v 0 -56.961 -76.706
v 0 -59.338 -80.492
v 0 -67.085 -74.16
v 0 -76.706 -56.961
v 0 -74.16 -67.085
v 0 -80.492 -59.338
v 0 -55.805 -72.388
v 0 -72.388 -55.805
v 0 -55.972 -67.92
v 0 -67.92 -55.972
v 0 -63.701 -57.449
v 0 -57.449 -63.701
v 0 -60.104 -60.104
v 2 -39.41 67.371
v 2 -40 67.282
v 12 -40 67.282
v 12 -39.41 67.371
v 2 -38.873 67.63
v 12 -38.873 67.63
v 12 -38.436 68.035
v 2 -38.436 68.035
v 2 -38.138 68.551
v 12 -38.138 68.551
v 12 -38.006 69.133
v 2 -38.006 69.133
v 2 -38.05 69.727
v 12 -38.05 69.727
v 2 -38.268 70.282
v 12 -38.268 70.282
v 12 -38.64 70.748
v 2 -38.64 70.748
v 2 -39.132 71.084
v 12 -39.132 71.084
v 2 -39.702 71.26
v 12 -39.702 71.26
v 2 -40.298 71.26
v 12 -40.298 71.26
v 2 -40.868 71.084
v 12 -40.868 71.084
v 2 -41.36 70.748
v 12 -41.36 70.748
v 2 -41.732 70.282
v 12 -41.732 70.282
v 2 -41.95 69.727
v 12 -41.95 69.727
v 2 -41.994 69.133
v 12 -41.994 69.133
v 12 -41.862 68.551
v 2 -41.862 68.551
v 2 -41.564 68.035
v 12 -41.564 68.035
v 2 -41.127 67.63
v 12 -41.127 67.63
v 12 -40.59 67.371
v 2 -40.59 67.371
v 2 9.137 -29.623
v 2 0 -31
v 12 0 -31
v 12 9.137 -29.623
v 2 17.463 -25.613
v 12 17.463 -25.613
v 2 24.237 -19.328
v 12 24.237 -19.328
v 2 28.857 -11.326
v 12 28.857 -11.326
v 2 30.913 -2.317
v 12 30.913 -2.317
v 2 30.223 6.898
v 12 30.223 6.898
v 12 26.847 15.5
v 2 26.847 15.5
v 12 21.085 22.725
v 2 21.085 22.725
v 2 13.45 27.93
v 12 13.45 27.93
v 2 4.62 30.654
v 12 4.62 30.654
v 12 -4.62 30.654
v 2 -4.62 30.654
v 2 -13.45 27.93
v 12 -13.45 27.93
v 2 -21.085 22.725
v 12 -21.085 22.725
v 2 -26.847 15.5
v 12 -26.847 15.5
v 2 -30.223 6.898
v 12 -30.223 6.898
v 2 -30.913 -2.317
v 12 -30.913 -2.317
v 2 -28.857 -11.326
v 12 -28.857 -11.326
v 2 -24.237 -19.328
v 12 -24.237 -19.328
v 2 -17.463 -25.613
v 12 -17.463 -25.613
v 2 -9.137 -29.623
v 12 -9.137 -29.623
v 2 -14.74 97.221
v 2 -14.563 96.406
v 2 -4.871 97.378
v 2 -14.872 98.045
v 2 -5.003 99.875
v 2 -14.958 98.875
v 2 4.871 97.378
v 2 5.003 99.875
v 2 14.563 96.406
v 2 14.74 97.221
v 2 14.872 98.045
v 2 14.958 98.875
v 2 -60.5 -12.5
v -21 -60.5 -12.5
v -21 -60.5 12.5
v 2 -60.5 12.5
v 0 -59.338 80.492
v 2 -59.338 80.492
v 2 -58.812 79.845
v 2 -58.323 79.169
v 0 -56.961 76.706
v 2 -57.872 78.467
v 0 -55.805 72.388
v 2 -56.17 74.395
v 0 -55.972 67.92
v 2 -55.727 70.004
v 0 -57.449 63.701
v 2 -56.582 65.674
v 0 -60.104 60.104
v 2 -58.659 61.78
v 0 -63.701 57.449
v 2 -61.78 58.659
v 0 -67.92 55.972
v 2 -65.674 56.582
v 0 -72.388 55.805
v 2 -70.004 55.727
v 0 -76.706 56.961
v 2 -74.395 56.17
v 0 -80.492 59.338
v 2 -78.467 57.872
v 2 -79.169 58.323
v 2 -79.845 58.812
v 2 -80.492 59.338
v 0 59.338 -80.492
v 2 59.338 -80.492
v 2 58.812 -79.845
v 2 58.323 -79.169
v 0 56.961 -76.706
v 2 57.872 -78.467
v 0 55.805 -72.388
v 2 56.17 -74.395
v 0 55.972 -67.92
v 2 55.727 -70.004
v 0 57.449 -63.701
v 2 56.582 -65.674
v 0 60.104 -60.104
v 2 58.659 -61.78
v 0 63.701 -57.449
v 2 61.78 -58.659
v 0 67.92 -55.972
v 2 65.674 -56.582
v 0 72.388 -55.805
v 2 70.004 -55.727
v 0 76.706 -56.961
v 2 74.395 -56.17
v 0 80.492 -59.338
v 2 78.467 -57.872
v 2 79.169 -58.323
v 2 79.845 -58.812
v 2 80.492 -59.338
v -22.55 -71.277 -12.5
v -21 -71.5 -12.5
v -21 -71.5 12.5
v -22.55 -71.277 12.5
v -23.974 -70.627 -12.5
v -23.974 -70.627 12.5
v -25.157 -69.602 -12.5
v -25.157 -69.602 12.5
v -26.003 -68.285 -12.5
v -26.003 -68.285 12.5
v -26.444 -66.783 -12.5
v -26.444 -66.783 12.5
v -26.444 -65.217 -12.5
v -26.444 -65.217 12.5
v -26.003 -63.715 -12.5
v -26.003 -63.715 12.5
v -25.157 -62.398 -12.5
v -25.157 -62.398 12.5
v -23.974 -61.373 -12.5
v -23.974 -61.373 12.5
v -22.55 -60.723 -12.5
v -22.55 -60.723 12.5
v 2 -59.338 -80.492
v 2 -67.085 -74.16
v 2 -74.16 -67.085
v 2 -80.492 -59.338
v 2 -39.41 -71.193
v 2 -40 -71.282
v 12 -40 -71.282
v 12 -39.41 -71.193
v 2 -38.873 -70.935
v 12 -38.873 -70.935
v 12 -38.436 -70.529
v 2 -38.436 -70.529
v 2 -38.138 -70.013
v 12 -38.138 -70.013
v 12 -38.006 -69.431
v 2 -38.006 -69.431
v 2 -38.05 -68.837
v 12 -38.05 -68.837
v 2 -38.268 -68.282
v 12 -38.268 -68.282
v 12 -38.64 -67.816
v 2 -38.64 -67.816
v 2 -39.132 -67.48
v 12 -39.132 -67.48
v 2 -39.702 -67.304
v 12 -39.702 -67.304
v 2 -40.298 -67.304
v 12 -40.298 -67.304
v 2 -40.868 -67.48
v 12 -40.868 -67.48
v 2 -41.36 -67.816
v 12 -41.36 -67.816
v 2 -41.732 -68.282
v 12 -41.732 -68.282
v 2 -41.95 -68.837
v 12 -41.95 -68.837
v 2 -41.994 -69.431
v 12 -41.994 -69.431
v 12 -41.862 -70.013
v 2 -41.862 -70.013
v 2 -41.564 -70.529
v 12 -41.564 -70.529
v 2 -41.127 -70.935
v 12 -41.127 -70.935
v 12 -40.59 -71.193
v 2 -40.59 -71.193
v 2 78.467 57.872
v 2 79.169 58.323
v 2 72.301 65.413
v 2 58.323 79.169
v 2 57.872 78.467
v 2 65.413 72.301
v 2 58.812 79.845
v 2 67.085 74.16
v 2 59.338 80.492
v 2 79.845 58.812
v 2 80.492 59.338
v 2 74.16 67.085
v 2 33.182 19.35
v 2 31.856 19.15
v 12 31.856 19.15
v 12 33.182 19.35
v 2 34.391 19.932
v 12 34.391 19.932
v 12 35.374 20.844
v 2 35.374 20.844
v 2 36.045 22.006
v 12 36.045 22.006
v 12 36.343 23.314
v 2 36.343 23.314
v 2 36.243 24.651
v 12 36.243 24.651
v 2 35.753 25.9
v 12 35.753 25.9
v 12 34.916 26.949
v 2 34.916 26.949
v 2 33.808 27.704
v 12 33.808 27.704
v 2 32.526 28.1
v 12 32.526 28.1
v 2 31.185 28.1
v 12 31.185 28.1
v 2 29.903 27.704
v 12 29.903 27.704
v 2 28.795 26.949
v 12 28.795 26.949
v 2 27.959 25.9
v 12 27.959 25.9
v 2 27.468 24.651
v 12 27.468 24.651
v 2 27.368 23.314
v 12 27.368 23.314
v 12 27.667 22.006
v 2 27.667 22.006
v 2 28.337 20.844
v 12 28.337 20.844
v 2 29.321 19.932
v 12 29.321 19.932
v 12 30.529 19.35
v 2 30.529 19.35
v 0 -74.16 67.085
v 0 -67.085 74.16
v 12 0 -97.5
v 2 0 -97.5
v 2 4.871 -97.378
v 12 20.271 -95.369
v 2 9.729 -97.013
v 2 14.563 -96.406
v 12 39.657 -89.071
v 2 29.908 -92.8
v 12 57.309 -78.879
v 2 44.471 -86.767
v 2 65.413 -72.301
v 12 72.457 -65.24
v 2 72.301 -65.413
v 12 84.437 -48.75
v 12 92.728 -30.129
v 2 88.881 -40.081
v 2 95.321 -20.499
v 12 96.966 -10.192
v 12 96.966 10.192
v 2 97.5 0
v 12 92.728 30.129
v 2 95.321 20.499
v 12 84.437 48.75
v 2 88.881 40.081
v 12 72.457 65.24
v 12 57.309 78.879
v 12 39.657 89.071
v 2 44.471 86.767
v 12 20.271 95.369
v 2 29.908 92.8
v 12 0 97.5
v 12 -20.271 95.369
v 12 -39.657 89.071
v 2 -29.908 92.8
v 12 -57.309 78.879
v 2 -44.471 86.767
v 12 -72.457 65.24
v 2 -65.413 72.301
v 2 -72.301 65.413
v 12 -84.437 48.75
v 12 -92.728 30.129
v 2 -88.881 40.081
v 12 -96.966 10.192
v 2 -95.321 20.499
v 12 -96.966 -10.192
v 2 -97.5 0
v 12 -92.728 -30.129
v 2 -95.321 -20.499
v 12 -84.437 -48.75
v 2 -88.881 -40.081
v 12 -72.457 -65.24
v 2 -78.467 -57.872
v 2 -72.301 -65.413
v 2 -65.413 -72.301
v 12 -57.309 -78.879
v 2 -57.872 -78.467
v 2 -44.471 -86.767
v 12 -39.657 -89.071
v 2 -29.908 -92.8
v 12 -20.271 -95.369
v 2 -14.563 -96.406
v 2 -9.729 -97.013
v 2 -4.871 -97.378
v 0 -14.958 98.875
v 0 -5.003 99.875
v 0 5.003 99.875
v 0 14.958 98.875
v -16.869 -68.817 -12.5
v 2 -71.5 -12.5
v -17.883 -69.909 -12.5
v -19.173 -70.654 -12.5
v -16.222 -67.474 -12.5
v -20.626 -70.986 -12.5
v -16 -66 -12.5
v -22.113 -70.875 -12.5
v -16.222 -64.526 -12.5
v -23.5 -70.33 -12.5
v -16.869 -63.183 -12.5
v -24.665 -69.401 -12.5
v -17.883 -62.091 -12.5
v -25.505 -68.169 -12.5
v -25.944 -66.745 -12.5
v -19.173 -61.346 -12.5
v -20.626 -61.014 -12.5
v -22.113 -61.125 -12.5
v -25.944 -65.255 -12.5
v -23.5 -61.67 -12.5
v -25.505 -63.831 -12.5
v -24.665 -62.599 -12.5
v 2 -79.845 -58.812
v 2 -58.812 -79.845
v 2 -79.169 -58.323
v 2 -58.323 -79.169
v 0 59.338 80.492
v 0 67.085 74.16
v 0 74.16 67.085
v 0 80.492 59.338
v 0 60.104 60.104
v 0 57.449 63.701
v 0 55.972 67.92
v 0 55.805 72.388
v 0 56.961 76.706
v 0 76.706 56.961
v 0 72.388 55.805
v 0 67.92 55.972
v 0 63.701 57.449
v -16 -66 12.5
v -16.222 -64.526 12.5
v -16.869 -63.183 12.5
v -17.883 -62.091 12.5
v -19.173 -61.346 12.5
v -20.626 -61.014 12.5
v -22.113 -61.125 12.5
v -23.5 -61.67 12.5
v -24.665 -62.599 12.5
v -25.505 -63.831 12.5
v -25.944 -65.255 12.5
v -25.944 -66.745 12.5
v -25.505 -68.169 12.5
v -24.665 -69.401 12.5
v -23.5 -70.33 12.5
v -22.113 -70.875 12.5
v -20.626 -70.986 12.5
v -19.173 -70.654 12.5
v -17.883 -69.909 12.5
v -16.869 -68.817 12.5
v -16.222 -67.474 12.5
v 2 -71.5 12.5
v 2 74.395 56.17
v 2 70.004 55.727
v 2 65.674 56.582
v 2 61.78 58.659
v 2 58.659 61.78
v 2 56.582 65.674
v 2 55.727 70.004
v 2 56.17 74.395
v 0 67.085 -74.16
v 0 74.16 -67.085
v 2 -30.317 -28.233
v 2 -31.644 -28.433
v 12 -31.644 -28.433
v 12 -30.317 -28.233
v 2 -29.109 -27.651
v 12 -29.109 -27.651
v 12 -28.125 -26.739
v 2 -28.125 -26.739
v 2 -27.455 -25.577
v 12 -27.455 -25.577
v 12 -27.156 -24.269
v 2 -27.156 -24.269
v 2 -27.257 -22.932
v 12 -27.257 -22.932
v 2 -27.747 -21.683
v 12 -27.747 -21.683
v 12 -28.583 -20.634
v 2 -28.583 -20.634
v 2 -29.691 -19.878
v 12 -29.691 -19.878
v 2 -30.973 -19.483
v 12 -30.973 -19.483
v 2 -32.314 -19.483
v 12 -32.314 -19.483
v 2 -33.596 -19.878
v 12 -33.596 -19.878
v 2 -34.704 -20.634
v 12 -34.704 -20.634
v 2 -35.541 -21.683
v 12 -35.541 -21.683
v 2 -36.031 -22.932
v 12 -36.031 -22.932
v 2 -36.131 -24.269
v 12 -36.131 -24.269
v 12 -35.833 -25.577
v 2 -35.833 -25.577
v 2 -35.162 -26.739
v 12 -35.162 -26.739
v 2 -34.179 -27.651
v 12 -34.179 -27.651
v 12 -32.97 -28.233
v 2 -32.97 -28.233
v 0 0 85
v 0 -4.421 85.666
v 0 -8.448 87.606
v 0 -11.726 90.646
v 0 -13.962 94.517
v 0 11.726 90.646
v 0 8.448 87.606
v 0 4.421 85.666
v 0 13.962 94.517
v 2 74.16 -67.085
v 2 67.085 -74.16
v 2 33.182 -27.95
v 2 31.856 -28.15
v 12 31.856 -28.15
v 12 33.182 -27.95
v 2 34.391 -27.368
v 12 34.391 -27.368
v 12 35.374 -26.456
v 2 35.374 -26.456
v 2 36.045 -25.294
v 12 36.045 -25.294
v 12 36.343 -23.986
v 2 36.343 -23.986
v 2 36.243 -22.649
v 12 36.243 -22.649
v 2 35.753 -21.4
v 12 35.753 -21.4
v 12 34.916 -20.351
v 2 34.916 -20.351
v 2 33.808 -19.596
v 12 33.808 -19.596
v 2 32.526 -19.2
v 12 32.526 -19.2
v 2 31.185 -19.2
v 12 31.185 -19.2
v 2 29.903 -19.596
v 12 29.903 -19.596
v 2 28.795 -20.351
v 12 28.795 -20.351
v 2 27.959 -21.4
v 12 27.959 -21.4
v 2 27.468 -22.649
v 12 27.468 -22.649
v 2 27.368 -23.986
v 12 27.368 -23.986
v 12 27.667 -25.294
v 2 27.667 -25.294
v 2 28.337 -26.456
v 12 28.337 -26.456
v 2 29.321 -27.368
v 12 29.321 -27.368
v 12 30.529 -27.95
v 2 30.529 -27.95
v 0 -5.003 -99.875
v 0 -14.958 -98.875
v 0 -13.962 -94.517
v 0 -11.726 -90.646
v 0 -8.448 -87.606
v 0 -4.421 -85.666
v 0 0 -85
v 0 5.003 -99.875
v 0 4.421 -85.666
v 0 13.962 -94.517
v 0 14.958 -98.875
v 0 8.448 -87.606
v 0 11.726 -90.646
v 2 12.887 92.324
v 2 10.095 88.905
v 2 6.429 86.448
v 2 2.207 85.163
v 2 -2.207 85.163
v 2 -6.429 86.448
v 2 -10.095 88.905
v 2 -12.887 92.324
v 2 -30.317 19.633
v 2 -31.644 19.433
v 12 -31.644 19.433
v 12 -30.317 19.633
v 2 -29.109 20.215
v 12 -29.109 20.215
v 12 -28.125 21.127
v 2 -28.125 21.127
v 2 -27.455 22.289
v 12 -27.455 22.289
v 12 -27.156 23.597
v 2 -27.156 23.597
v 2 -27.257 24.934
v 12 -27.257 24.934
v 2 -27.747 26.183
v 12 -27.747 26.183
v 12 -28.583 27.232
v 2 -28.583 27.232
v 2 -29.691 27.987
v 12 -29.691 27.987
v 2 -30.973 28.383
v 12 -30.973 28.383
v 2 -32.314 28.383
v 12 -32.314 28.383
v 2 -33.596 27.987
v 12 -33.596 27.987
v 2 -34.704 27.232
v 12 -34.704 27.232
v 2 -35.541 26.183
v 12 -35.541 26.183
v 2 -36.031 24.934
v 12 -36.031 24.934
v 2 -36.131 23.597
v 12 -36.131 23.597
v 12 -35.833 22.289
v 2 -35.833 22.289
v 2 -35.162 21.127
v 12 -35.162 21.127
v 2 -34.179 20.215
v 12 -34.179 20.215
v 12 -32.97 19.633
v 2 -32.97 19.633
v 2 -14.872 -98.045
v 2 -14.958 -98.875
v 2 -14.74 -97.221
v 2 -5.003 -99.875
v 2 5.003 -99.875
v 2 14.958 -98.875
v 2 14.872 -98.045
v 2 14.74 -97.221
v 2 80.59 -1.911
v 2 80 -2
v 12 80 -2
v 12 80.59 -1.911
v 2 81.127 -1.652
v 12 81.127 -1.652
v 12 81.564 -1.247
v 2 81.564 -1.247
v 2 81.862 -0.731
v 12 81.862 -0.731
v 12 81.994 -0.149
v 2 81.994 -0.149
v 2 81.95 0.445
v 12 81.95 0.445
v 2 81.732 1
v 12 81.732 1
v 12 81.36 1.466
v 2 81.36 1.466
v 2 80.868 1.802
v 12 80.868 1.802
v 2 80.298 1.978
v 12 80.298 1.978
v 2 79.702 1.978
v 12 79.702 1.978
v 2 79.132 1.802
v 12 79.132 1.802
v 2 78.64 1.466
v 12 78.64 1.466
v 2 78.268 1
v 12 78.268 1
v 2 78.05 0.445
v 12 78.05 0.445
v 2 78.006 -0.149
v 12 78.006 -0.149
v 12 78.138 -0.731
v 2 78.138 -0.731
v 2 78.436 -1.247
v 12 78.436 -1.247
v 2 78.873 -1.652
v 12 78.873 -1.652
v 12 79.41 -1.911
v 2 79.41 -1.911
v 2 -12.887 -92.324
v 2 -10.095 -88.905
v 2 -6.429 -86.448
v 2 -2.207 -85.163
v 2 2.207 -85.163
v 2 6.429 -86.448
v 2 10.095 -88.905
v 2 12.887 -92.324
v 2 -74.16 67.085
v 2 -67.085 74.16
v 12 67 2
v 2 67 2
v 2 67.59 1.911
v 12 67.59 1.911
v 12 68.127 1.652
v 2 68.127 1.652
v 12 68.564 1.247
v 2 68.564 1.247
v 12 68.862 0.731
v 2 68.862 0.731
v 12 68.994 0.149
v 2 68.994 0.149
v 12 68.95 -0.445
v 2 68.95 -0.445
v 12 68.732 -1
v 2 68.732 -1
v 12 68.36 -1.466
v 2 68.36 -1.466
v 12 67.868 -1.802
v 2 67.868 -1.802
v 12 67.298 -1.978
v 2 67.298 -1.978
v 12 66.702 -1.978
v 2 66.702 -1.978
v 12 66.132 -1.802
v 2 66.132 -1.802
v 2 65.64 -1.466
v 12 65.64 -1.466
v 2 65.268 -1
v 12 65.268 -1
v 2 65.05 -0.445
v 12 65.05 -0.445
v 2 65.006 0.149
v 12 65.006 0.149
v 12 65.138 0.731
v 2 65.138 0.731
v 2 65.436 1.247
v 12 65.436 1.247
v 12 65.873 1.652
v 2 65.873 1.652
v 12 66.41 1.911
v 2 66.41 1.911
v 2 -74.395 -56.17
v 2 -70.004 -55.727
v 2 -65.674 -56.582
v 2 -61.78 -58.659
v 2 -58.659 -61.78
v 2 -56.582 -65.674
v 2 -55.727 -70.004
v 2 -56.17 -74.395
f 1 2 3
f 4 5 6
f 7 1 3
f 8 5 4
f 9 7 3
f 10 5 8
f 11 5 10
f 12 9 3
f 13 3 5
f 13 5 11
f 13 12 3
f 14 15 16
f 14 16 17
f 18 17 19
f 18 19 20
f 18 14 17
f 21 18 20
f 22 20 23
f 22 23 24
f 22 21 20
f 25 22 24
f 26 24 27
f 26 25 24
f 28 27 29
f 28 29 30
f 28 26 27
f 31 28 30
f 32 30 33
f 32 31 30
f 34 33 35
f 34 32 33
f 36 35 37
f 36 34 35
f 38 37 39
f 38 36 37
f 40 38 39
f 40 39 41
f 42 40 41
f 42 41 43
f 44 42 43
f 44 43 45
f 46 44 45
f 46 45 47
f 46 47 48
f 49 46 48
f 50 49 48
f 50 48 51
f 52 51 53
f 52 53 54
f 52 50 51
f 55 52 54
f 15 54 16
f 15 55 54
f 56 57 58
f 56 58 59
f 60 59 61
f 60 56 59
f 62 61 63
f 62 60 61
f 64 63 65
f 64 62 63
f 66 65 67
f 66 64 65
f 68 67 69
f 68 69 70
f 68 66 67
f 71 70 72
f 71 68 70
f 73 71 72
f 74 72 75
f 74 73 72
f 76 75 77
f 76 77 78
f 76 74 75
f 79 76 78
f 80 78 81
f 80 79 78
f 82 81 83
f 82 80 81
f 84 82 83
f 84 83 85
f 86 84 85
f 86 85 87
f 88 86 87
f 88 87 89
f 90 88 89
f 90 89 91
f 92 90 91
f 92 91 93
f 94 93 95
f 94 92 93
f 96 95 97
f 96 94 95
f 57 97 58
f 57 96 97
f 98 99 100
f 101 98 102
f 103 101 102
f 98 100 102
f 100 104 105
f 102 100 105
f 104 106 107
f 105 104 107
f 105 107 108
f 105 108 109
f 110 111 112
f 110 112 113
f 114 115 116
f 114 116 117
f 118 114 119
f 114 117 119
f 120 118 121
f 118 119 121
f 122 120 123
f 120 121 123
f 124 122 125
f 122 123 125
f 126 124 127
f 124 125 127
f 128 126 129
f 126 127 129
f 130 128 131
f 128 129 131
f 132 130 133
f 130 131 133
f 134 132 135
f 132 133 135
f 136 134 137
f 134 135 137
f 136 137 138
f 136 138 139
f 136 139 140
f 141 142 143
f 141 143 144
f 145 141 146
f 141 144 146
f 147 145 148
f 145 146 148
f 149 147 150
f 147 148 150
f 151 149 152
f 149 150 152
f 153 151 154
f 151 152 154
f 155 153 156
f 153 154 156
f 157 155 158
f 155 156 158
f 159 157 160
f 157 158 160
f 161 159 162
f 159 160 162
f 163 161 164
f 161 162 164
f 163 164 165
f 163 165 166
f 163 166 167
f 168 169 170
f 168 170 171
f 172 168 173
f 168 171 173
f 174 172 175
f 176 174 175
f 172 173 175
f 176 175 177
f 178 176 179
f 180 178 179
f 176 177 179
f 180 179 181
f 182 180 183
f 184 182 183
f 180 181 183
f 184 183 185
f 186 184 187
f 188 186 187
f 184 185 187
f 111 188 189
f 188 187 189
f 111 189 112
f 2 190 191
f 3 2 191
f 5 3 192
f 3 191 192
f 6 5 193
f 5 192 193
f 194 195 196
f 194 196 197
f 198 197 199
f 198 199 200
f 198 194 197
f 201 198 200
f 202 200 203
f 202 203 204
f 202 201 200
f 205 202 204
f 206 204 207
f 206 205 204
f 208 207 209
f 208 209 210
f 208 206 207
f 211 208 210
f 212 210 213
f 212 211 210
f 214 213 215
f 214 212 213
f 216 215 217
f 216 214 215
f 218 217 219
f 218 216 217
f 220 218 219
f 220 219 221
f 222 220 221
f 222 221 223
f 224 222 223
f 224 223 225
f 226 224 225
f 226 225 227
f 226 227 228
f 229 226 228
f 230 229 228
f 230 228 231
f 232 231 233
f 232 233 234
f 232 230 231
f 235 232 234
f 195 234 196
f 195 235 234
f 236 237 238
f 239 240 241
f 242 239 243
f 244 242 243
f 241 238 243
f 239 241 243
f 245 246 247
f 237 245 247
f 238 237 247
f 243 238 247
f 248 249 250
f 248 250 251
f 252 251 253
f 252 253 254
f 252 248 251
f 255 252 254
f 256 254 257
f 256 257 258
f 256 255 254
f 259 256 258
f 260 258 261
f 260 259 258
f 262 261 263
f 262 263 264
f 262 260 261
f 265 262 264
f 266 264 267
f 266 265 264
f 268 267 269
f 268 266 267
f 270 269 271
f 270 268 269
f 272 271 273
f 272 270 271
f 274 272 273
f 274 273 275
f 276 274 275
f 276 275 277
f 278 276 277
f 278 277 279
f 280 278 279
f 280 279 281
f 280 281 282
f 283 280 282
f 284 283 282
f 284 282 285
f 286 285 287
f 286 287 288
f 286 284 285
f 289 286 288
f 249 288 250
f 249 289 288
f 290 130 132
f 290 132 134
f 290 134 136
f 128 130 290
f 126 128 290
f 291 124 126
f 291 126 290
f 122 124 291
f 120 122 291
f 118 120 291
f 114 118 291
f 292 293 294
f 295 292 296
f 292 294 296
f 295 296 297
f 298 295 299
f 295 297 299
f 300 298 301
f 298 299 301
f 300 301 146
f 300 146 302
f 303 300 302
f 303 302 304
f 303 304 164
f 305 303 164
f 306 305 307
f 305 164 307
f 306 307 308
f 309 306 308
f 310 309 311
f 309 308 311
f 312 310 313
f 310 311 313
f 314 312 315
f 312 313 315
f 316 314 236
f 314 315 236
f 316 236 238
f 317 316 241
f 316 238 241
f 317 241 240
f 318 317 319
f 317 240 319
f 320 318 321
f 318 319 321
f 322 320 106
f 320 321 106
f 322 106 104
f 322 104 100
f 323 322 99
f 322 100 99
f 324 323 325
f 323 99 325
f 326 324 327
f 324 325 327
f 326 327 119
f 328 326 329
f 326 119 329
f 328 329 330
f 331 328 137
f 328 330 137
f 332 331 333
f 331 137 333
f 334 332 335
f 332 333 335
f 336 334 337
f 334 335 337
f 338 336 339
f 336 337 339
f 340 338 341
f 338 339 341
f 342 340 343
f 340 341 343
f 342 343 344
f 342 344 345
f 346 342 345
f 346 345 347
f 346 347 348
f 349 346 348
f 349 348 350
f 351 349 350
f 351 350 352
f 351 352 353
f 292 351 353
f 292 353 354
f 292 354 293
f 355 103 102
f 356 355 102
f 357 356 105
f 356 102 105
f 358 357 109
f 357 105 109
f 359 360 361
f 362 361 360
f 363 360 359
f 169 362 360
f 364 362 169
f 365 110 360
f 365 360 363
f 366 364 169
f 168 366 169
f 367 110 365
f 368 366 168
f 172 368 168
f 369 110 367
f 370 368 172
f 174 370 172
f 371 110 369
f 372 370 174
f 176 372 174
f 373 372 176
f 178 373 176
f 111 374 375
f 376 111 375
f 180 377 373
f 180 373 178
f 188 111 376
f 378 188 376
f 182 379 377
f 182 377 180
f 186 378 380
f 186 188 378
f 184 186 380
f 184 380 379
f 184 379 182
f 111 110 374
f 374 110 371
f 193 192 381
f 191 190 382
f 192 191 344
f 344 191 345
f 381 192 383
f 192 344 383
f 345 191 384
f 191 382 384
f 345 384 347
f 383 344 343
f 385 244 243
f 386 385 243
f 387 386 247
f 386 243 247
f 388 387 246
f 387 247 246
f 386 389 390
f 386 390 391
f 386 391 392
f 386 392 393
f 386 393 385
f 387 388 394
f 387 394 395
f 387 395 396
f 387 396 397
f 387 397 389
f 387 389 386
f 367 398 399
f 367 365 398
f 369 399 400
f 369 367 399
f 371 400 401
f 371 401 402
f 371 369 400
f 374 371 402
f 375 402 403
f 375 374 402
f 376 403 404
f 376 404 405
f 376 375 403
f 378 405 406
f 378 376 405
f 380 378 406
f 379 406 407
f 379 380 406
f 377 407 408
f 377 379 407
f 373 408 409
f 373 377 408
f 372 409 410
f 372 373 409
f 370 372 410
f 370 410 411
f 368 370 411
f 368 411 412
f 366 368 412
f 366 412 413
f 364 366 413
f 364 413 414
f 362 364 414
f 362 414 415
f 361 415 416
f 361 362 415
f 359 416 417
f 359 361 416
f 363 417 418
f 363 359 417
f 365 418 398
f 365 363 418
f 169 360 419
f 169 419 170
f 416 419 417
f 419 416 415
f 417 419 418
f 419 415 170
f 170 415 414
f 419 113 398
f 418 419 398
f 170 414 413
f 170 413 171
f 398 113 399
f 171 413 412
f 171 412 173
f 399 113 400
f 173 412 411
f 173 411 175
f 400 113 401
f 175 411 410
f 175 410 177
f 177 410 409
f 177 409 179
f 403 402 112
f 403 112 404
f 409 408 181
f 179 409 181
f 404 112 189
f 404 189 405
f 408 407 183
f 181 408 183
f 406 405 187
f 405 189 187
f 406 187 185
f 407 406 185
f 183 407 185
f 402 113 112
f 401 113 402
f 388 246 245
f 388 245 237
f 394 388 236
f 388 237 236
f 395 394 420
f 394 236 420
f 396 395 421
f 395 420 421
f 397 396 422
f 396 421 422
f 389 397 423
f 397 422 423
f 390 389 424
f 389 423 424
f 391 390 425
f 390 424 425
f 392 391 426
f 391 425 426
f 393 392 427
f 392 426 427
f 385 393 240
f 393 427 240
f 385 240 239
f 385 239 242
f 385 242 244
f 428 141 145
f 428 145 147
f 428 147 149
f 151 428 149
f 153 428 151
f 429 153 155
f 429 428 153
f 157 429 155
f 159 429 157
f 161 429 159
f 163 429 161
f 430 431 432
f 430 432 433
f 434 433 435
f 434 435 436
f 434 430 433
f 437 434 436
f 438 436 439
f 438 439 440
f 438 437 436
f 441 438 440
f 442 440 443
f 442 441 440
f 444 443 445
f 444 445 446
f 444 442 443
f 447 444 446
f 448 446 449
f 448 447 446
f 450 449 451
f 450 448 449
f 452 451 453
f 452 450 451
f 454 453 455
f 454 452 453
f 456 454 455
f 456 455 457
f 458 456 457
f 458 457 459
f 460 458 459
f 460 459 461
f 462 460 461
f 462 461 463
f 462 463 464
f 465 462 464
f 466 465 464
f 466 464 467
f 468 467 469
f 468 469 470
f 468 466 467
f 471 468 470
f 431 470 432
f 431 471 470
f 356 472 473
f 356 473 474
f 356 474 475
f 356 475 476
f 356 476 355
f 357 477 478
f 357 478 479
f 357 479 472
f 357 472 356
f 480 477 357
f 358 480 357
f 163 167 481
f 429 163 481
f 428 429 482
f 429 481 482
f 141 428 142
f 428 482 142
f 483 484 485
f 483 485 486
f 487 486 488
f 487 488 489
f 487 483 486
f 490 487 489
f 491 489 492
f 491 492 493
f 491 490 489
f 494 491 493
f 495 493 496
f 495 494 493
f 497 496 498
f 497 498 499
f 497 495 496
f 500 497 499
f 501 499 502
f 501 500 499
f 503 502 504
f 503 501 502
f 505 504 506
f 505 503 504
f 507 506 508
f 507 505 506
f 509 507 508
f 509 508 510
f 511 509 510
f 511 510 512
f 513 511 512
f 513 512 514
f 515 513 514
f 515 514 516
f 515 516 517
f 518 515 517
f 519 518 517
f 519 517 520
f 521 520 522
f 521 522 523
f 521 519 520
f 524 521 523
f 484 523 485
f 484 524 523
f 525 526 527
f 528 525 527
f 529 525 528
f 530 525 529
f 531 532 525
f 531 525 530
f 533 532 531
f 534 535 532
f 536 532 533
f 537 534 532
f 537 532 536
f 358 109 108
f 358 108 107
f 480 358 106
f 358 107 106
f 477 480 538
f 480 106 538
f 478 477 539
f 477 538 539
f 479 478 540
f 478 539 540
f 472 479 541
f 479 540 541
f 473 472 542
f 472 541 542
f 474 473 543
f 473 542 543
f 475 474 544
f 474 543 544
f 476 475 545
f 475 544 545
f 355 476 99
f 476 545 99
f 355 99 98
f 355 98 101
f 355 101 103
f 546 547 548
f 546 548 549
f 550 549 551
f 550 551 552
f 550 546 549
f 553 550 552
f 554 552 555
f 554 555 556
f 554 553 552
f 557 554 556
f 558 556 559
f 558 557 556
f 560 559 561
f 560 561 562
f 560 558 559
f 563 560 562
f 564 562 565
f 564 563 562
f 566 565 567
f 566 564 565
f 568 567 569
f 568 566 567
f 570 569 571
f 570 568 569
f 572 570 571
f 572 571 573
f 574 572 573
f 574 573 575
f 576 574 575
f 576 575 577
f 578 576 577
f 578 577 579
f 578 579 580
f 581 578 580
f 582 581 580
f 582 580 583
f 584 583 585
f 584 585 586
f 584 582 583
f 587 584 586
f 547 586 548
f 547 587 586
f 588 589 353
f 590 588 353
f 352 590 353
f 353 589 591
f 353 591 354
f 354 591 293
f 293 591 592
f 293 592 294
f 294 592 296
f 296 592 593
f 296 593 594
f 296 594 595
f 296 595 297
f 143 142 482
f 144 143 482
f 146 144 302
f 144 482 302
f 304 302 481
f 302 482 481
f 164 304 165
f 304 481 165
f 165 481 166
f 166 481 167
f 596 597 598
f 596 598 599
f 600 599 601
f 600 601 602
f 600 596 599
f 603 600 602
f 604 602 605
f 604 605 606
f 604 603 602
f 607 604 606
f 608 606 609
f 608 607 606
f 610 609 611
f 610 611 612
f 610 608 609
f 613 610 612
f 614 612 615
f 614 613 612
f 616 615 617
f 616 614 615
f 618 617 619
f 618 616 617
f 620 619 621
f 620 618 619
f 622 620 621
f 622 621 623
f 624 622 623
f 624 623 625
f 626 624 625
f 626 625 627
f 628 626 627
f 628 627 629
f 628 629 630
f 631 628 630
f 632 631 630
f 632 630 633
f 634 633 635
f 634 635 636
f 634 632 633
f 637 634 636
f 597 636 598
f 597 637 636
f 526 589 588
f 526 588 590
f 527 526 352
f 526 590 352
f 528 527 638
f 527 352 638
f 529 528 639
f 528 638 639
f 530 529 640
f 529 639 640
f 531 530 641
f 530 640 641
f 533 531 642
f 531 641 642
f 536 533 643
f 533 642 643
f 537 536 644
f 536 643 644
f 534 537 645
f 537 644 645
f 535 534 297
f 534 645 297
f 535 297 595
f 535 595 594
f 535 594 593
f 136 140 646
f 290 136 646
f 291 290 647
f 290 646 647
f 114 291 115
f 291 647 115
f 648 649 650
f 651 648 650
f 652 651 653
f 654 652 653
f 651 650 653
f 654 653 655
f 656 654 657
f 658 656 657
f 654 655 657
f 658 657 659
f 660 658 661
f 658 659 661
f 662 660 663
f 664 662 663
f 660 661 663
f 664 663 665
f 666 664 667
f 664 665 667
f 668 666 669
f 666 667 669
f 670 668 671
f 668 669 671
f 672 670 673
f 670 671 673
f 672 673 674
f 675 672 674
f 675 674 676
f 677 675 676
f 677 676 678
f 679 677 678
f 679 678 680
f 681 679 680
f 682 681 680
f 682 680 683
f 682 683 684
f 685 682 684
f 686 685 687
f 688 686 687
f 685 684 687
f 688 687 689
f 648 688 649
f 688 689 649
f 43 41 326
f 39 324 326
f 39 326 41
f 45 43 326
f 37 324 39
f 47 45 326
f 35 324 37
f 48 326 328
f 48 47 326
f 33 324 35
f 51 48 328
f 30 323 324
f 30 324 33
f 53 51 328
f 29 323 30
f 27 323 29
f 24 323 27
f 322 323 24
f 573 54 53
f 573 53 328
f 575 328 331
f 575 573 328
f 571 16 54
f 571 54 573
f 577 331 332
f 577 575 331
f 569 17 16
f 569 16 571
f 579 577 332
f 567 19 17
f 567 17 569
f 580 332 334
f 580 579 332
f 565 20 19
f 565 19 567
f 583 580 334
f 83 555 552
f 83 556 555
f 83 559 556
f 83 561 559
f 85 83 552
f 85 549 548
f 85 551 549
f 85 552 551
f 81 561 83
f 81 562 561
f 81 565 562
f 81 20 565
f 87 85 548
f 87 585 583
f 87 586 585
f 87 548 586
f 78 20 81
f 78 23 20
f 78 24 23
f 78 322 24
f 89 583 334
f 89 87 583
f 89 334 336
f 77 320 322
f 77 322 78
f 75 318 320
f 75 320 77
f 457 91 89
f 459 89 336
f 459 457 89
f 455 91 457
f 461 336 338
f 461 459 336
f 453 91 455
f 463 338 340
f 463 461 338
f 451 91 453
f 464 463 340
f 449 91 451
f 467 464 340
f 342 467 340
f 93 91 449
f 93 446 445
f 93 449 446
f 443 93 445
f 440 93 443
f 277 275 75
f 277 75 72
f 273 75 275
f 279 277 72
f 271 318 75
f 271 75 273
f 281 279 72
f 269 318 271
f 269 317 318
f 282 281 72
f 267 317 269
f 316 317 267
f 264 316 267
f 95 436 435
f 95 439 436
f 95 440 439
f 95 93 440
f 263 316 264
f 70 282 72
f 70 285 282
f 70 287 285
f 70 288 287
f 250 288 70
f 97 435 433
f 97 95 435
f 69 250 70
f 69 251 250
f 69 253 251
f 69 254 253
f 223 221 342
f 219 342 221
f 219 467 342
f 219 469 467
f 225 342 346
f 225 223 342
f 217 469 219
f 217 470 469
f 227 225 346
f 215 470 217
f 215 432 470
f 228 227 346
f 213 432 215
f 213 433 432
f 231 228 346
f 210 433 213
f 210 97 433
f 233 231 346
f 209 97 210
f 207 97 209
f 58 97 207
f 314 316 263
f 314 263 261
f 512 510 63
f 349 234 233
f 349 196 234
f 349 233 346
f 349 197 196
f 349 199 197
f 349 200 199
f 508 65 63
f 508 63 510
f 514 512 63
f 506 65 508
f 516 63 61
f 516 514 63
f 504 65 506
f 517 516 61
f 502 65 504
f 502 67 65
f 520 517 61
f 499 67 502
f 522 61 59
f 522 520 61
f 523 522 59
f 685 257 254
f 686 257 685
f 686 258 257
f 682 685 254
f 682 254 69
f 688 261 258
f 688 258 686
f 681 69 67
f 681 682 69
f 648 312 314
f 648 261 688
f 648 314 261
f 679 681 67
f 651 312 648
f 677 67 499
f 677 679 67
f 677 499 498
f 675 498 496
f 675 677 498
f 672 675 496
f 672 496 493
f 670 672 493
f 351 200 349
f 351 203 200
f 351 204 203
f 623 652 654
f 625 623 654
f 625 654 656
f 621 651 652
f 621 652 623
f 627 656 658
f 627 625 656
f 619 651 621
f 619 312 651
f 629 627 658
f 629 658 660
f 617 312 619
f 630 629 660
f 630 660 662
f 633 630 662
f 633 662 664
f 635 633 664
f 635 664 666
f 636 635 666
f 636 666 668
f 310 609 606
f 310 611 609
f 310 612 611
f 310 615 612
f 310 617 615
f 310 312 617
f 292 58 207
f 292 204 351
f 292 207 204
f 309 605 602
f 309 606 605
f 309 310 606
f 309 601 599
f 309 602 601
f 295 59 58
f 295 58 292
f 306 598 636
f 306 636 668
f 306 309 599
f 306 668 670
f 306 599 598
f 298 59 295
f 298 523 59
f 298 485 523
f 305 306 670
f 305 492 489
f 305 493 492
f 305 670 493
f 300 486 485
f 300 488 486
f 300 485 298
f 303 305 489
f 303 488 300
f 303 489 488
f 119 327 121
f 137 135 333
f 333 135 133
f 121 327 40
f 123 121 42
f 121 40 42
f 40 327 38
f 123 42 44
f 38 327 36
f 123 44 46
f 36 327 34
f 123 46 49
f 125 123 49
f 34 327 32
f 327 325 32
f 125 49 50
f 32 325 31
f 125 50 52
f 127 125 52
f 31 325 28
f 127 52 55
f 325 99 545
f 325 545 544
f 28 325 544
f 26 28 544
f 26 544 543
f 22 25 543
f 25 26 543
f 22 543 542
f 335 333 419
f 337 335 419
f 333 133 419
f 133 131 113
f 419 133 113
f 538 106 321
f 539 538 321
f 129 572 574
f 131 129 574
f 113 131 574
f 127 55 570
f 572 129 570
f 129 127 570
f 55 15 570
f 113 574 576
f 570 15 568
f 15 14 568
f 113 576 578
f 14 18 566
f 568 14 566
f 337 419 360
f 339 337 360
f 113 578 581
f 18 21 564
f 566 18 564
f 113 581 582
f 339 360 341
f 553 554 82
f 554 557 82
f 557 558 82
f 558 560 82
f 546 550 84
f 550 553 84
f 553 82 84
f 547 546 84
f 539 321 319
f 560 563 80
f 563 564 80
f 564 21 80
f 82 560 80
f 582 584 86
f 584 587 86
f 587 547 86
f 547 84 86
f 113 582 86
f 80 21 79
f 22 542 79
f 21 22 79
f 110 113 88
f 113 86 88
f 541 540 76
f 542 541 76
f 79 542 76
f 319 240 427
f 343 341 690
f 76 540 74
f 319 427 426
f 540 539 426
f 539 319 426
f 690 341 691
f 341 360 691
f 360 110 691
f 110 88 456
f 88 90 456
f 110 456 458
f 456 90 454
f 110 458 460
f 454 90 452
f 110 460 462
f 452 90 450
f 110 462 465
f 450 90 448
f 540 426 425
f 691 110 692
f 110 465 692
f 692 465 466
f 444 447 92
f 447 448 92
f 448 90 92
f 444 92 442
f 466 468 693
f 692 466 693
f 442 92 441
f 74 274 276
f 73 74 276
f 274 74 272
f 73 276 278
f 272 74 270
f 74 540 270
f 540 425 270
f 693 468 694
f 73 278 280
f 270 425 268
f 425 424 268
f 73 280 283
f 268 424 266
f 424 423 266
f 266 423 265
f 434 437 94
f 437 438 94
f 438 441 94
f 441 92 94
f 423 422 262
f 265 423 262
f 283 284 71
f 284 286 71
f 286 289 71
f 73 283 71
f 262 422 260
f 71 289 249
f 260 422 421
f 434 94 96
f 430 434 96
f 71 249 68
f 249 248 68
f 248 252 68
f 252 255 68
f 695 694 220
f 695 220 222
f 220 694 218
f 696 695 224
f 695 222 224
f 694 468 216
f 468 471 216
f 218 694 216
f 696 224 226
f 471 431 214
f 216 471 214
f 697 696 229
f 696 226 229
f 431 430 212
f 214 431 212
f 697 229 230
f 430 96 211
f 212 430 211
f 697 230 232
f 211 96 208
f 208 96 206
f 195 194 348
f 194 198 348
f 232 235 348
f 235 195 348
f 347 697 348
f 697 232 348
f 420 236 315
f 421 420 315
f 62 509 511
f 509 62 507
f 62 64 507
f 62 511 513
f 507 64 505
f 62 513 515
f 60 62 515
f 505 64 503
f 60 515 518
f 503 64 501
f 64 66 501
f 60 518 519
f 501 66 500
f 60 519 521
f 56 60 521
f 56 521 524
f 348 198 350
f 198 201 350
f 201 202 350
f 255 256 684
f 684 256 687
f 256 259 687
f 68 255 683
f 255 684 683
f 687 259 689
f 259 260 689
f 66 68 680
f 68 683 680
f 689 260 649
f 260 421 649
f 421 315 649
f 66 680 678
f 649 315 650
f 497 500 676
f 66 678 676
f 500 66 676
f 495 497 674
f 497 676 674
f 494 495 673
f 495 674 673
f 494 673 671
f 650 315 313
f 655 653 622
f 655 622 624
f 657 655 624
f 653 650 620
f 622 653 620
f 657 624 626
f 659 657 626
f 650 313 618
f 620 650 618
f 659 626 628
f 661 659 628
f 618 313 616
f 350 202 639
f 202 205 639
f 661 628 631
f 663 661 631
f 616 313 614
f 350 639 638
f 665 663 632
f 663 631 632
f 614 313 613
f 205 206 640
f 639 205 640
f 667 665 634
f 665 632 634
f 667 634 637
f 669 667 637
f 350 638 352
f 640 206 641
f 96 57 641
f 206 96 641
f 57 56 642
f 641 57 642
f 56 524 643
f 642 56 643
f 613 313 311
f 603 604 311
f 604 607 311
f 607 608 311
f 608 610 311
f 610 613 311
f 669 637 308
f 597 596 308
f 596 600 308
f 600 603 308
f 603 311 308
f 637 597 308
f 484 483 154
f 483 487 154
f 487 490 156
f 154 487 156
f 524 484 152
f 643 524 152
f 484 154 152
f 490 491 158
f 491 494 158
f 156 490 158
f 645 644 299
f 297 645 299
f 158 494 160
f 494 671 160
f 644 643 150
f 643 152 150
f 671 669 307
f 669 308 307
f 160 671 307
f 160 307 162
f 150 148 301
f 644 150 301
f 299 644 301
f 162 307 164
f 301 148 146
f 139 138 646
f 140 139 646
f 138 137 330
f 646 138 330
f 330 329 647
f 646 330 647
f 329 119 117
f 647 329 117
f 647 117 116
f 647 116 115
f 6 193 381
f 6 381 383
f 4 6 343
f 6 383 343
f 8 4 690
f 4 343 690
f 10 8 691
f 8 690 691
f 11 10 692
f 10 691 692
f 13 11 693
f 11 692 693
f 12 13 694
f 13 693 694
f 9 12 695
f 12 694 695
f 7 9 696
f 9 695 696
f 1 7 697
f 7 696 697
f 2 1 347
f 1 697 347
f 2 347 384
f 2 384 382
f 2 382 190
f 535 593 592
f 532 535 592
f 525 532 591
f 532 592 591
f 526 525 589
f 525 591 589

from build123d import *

# Parameters (mm, degrees)
BOSS_EXTRUDE1_START = 2
SKETCH1_R           = 97.5
SKETCH1_R_2         = 31
SKETCH1_R_3         = 4.5
SKETCH1_R_4         = 2
BOSS_EXTRUDE1_DEPTH = 10
BOSS_EXTRUDE2_DEPTH = 2
SKETCH7_R           = 2
CUT_EXTRUDE1_DEPTH  = 10
SKETCH8_R           = 5
BOSS_EXTRUDE3_DEPTH = 12.5


with BuildPart() as part:
    # Sketch1 → Boss-Extrude1 (new body)
    with BuildSketch(Plane(origin=(0, 0, 0), x_dir=(0, 0, -1), z_dir=(1, 0, 0)).offset(BOSS_EXTRUDE1_START)):
        Circle(SKETCH1_R)
        Circle(SKETCH1_R_2, mode=Mode.SUBTRACT)
        with Locations((23.65, 31.8556608)):
            Circle(SKETCH1_R_3, mode=Mode.SUBTRACT)
        with Locations((23.932849605, -31.643709245)):
            Circle(SKETCH1_R_3, mode=Mode.SUBTRACT)
        with Locations((-23.932849605, -31.643709245)):
            Circle(SKETCH1_R_3, mode=Mode.SUBTRACT)
        with Locations((-23.65, 31.8556608)):
            Circle(SKETCH1_R_3, mode=Mode.SUBTRACT)
        with Locations((0, 80)):
            Circle(SKETCH1_R_4, mode=Mode.SUBTRACT)
        with Locations((69.282032303, -40)):
            Circle(SKETCH1_R_4, mode=Mode.SUBTRACT)
        with Locations((-69.282032303, -40)):
            Circle(SKETCH1_R_4, mode=Mode.SUBTRACT)
    extrude(amount=BOSS_EXTRUDE1_DEPTH)

    # Sketch6 → Boss-Extrude2 (add)
    with BuildSketch(Plane.ZY.offset(-2)):
        with BuildLine():
            ThreePointArc((80.491911572, 59.338454408), (70.710678119, 70.710678119), (59.338454408, 80.491911572))
            ThreePointArc((59.338454408, 80.491911572), (60.104076401, 60.104076401), (80.491911572, 59.338454408))
        make_face()
        with BuildLine():
            ThreePointArc((98.875, 14.957753006), (85, 0), (98.875, -14.957753006))
            ThreePointArc((98.875, -14.957753006), (100, 0), (98.875, 14.957753006))
        make_face()
        with BuildLine():
            ThreePointArc((80.491911572, -59.338454408), (60.104076401, -60.104076401), (59.338454408, -80.491911572))
            ThreePointArc((59.338454408, -80.491911572), (70.710678119, -70.710678119), (80.491911572, -59.338454408))
        make_face()
        with BuildLine():
            ThreePointArc((-59.338454408, -80.491911572), (-60.104076401, -60.104076401), (-80.491911572, -59.338454408))
            ThreePointArc((-80.491911572, -59.338454408), (-70.710678119, -70.710678119), (-59.338454408, -80.491911572))
        make_face()
        with BuildLine():
            ThreePointArc((-98.875, -14.957753006), (-85, 0), (-98.875, 14.957753006))
            ThreePointArc((-98.875, 14.957753006), (-100, 0), (-98.875, -14.957753006))
        make_face()
        with BuildLine():
            ThreePointArc((-80.491911572, 59.338454408), (-60.104076401, 60.104076401), (-59.338454408, 80.491911572))
            ThreePointArc((-59.338454408, 80.491911572), (-70.710678119, 70.710678119), (-80.491911572, 59.338454408))
        make_face()
    extrude(amount=BOSS_EXTRUDE2_DEPTH)

    # Sketch7 → Cut-Extrude1 (cut)
    with BuildSketch(Plane.ZY.offset(-2)):
        with Locations((0, 67)):
            Circle(SKETCH7_R)
    extrude(amount=-CUT_EXTRUDE1_DEPTH, mode=Mode.SUBTRACT)

    # Sketch8 → Boss-Extrude3 (add, symmetric)
    with BuildSketch(Plane.XY):
        with BuildLine():
            Line((-21, -60.5), (3.212451129, -60.5))
            Line((3.212451129, -60.5), (3.212451129, -71.5))
            Line((3.212451129, -71.5), (-21, -71.5))
            ThreePointArc((-21, -71.5), (-26.5, -66), (-21, -60.5))
        make_face()
        with Locations((-21, -66)):
            Circle(SKETCH8_R, mode=Mode.SUBTRACT)
    extrude(amount=BOSS_EXTRUDE3_DEPTH, both=True)


solid = part.part
